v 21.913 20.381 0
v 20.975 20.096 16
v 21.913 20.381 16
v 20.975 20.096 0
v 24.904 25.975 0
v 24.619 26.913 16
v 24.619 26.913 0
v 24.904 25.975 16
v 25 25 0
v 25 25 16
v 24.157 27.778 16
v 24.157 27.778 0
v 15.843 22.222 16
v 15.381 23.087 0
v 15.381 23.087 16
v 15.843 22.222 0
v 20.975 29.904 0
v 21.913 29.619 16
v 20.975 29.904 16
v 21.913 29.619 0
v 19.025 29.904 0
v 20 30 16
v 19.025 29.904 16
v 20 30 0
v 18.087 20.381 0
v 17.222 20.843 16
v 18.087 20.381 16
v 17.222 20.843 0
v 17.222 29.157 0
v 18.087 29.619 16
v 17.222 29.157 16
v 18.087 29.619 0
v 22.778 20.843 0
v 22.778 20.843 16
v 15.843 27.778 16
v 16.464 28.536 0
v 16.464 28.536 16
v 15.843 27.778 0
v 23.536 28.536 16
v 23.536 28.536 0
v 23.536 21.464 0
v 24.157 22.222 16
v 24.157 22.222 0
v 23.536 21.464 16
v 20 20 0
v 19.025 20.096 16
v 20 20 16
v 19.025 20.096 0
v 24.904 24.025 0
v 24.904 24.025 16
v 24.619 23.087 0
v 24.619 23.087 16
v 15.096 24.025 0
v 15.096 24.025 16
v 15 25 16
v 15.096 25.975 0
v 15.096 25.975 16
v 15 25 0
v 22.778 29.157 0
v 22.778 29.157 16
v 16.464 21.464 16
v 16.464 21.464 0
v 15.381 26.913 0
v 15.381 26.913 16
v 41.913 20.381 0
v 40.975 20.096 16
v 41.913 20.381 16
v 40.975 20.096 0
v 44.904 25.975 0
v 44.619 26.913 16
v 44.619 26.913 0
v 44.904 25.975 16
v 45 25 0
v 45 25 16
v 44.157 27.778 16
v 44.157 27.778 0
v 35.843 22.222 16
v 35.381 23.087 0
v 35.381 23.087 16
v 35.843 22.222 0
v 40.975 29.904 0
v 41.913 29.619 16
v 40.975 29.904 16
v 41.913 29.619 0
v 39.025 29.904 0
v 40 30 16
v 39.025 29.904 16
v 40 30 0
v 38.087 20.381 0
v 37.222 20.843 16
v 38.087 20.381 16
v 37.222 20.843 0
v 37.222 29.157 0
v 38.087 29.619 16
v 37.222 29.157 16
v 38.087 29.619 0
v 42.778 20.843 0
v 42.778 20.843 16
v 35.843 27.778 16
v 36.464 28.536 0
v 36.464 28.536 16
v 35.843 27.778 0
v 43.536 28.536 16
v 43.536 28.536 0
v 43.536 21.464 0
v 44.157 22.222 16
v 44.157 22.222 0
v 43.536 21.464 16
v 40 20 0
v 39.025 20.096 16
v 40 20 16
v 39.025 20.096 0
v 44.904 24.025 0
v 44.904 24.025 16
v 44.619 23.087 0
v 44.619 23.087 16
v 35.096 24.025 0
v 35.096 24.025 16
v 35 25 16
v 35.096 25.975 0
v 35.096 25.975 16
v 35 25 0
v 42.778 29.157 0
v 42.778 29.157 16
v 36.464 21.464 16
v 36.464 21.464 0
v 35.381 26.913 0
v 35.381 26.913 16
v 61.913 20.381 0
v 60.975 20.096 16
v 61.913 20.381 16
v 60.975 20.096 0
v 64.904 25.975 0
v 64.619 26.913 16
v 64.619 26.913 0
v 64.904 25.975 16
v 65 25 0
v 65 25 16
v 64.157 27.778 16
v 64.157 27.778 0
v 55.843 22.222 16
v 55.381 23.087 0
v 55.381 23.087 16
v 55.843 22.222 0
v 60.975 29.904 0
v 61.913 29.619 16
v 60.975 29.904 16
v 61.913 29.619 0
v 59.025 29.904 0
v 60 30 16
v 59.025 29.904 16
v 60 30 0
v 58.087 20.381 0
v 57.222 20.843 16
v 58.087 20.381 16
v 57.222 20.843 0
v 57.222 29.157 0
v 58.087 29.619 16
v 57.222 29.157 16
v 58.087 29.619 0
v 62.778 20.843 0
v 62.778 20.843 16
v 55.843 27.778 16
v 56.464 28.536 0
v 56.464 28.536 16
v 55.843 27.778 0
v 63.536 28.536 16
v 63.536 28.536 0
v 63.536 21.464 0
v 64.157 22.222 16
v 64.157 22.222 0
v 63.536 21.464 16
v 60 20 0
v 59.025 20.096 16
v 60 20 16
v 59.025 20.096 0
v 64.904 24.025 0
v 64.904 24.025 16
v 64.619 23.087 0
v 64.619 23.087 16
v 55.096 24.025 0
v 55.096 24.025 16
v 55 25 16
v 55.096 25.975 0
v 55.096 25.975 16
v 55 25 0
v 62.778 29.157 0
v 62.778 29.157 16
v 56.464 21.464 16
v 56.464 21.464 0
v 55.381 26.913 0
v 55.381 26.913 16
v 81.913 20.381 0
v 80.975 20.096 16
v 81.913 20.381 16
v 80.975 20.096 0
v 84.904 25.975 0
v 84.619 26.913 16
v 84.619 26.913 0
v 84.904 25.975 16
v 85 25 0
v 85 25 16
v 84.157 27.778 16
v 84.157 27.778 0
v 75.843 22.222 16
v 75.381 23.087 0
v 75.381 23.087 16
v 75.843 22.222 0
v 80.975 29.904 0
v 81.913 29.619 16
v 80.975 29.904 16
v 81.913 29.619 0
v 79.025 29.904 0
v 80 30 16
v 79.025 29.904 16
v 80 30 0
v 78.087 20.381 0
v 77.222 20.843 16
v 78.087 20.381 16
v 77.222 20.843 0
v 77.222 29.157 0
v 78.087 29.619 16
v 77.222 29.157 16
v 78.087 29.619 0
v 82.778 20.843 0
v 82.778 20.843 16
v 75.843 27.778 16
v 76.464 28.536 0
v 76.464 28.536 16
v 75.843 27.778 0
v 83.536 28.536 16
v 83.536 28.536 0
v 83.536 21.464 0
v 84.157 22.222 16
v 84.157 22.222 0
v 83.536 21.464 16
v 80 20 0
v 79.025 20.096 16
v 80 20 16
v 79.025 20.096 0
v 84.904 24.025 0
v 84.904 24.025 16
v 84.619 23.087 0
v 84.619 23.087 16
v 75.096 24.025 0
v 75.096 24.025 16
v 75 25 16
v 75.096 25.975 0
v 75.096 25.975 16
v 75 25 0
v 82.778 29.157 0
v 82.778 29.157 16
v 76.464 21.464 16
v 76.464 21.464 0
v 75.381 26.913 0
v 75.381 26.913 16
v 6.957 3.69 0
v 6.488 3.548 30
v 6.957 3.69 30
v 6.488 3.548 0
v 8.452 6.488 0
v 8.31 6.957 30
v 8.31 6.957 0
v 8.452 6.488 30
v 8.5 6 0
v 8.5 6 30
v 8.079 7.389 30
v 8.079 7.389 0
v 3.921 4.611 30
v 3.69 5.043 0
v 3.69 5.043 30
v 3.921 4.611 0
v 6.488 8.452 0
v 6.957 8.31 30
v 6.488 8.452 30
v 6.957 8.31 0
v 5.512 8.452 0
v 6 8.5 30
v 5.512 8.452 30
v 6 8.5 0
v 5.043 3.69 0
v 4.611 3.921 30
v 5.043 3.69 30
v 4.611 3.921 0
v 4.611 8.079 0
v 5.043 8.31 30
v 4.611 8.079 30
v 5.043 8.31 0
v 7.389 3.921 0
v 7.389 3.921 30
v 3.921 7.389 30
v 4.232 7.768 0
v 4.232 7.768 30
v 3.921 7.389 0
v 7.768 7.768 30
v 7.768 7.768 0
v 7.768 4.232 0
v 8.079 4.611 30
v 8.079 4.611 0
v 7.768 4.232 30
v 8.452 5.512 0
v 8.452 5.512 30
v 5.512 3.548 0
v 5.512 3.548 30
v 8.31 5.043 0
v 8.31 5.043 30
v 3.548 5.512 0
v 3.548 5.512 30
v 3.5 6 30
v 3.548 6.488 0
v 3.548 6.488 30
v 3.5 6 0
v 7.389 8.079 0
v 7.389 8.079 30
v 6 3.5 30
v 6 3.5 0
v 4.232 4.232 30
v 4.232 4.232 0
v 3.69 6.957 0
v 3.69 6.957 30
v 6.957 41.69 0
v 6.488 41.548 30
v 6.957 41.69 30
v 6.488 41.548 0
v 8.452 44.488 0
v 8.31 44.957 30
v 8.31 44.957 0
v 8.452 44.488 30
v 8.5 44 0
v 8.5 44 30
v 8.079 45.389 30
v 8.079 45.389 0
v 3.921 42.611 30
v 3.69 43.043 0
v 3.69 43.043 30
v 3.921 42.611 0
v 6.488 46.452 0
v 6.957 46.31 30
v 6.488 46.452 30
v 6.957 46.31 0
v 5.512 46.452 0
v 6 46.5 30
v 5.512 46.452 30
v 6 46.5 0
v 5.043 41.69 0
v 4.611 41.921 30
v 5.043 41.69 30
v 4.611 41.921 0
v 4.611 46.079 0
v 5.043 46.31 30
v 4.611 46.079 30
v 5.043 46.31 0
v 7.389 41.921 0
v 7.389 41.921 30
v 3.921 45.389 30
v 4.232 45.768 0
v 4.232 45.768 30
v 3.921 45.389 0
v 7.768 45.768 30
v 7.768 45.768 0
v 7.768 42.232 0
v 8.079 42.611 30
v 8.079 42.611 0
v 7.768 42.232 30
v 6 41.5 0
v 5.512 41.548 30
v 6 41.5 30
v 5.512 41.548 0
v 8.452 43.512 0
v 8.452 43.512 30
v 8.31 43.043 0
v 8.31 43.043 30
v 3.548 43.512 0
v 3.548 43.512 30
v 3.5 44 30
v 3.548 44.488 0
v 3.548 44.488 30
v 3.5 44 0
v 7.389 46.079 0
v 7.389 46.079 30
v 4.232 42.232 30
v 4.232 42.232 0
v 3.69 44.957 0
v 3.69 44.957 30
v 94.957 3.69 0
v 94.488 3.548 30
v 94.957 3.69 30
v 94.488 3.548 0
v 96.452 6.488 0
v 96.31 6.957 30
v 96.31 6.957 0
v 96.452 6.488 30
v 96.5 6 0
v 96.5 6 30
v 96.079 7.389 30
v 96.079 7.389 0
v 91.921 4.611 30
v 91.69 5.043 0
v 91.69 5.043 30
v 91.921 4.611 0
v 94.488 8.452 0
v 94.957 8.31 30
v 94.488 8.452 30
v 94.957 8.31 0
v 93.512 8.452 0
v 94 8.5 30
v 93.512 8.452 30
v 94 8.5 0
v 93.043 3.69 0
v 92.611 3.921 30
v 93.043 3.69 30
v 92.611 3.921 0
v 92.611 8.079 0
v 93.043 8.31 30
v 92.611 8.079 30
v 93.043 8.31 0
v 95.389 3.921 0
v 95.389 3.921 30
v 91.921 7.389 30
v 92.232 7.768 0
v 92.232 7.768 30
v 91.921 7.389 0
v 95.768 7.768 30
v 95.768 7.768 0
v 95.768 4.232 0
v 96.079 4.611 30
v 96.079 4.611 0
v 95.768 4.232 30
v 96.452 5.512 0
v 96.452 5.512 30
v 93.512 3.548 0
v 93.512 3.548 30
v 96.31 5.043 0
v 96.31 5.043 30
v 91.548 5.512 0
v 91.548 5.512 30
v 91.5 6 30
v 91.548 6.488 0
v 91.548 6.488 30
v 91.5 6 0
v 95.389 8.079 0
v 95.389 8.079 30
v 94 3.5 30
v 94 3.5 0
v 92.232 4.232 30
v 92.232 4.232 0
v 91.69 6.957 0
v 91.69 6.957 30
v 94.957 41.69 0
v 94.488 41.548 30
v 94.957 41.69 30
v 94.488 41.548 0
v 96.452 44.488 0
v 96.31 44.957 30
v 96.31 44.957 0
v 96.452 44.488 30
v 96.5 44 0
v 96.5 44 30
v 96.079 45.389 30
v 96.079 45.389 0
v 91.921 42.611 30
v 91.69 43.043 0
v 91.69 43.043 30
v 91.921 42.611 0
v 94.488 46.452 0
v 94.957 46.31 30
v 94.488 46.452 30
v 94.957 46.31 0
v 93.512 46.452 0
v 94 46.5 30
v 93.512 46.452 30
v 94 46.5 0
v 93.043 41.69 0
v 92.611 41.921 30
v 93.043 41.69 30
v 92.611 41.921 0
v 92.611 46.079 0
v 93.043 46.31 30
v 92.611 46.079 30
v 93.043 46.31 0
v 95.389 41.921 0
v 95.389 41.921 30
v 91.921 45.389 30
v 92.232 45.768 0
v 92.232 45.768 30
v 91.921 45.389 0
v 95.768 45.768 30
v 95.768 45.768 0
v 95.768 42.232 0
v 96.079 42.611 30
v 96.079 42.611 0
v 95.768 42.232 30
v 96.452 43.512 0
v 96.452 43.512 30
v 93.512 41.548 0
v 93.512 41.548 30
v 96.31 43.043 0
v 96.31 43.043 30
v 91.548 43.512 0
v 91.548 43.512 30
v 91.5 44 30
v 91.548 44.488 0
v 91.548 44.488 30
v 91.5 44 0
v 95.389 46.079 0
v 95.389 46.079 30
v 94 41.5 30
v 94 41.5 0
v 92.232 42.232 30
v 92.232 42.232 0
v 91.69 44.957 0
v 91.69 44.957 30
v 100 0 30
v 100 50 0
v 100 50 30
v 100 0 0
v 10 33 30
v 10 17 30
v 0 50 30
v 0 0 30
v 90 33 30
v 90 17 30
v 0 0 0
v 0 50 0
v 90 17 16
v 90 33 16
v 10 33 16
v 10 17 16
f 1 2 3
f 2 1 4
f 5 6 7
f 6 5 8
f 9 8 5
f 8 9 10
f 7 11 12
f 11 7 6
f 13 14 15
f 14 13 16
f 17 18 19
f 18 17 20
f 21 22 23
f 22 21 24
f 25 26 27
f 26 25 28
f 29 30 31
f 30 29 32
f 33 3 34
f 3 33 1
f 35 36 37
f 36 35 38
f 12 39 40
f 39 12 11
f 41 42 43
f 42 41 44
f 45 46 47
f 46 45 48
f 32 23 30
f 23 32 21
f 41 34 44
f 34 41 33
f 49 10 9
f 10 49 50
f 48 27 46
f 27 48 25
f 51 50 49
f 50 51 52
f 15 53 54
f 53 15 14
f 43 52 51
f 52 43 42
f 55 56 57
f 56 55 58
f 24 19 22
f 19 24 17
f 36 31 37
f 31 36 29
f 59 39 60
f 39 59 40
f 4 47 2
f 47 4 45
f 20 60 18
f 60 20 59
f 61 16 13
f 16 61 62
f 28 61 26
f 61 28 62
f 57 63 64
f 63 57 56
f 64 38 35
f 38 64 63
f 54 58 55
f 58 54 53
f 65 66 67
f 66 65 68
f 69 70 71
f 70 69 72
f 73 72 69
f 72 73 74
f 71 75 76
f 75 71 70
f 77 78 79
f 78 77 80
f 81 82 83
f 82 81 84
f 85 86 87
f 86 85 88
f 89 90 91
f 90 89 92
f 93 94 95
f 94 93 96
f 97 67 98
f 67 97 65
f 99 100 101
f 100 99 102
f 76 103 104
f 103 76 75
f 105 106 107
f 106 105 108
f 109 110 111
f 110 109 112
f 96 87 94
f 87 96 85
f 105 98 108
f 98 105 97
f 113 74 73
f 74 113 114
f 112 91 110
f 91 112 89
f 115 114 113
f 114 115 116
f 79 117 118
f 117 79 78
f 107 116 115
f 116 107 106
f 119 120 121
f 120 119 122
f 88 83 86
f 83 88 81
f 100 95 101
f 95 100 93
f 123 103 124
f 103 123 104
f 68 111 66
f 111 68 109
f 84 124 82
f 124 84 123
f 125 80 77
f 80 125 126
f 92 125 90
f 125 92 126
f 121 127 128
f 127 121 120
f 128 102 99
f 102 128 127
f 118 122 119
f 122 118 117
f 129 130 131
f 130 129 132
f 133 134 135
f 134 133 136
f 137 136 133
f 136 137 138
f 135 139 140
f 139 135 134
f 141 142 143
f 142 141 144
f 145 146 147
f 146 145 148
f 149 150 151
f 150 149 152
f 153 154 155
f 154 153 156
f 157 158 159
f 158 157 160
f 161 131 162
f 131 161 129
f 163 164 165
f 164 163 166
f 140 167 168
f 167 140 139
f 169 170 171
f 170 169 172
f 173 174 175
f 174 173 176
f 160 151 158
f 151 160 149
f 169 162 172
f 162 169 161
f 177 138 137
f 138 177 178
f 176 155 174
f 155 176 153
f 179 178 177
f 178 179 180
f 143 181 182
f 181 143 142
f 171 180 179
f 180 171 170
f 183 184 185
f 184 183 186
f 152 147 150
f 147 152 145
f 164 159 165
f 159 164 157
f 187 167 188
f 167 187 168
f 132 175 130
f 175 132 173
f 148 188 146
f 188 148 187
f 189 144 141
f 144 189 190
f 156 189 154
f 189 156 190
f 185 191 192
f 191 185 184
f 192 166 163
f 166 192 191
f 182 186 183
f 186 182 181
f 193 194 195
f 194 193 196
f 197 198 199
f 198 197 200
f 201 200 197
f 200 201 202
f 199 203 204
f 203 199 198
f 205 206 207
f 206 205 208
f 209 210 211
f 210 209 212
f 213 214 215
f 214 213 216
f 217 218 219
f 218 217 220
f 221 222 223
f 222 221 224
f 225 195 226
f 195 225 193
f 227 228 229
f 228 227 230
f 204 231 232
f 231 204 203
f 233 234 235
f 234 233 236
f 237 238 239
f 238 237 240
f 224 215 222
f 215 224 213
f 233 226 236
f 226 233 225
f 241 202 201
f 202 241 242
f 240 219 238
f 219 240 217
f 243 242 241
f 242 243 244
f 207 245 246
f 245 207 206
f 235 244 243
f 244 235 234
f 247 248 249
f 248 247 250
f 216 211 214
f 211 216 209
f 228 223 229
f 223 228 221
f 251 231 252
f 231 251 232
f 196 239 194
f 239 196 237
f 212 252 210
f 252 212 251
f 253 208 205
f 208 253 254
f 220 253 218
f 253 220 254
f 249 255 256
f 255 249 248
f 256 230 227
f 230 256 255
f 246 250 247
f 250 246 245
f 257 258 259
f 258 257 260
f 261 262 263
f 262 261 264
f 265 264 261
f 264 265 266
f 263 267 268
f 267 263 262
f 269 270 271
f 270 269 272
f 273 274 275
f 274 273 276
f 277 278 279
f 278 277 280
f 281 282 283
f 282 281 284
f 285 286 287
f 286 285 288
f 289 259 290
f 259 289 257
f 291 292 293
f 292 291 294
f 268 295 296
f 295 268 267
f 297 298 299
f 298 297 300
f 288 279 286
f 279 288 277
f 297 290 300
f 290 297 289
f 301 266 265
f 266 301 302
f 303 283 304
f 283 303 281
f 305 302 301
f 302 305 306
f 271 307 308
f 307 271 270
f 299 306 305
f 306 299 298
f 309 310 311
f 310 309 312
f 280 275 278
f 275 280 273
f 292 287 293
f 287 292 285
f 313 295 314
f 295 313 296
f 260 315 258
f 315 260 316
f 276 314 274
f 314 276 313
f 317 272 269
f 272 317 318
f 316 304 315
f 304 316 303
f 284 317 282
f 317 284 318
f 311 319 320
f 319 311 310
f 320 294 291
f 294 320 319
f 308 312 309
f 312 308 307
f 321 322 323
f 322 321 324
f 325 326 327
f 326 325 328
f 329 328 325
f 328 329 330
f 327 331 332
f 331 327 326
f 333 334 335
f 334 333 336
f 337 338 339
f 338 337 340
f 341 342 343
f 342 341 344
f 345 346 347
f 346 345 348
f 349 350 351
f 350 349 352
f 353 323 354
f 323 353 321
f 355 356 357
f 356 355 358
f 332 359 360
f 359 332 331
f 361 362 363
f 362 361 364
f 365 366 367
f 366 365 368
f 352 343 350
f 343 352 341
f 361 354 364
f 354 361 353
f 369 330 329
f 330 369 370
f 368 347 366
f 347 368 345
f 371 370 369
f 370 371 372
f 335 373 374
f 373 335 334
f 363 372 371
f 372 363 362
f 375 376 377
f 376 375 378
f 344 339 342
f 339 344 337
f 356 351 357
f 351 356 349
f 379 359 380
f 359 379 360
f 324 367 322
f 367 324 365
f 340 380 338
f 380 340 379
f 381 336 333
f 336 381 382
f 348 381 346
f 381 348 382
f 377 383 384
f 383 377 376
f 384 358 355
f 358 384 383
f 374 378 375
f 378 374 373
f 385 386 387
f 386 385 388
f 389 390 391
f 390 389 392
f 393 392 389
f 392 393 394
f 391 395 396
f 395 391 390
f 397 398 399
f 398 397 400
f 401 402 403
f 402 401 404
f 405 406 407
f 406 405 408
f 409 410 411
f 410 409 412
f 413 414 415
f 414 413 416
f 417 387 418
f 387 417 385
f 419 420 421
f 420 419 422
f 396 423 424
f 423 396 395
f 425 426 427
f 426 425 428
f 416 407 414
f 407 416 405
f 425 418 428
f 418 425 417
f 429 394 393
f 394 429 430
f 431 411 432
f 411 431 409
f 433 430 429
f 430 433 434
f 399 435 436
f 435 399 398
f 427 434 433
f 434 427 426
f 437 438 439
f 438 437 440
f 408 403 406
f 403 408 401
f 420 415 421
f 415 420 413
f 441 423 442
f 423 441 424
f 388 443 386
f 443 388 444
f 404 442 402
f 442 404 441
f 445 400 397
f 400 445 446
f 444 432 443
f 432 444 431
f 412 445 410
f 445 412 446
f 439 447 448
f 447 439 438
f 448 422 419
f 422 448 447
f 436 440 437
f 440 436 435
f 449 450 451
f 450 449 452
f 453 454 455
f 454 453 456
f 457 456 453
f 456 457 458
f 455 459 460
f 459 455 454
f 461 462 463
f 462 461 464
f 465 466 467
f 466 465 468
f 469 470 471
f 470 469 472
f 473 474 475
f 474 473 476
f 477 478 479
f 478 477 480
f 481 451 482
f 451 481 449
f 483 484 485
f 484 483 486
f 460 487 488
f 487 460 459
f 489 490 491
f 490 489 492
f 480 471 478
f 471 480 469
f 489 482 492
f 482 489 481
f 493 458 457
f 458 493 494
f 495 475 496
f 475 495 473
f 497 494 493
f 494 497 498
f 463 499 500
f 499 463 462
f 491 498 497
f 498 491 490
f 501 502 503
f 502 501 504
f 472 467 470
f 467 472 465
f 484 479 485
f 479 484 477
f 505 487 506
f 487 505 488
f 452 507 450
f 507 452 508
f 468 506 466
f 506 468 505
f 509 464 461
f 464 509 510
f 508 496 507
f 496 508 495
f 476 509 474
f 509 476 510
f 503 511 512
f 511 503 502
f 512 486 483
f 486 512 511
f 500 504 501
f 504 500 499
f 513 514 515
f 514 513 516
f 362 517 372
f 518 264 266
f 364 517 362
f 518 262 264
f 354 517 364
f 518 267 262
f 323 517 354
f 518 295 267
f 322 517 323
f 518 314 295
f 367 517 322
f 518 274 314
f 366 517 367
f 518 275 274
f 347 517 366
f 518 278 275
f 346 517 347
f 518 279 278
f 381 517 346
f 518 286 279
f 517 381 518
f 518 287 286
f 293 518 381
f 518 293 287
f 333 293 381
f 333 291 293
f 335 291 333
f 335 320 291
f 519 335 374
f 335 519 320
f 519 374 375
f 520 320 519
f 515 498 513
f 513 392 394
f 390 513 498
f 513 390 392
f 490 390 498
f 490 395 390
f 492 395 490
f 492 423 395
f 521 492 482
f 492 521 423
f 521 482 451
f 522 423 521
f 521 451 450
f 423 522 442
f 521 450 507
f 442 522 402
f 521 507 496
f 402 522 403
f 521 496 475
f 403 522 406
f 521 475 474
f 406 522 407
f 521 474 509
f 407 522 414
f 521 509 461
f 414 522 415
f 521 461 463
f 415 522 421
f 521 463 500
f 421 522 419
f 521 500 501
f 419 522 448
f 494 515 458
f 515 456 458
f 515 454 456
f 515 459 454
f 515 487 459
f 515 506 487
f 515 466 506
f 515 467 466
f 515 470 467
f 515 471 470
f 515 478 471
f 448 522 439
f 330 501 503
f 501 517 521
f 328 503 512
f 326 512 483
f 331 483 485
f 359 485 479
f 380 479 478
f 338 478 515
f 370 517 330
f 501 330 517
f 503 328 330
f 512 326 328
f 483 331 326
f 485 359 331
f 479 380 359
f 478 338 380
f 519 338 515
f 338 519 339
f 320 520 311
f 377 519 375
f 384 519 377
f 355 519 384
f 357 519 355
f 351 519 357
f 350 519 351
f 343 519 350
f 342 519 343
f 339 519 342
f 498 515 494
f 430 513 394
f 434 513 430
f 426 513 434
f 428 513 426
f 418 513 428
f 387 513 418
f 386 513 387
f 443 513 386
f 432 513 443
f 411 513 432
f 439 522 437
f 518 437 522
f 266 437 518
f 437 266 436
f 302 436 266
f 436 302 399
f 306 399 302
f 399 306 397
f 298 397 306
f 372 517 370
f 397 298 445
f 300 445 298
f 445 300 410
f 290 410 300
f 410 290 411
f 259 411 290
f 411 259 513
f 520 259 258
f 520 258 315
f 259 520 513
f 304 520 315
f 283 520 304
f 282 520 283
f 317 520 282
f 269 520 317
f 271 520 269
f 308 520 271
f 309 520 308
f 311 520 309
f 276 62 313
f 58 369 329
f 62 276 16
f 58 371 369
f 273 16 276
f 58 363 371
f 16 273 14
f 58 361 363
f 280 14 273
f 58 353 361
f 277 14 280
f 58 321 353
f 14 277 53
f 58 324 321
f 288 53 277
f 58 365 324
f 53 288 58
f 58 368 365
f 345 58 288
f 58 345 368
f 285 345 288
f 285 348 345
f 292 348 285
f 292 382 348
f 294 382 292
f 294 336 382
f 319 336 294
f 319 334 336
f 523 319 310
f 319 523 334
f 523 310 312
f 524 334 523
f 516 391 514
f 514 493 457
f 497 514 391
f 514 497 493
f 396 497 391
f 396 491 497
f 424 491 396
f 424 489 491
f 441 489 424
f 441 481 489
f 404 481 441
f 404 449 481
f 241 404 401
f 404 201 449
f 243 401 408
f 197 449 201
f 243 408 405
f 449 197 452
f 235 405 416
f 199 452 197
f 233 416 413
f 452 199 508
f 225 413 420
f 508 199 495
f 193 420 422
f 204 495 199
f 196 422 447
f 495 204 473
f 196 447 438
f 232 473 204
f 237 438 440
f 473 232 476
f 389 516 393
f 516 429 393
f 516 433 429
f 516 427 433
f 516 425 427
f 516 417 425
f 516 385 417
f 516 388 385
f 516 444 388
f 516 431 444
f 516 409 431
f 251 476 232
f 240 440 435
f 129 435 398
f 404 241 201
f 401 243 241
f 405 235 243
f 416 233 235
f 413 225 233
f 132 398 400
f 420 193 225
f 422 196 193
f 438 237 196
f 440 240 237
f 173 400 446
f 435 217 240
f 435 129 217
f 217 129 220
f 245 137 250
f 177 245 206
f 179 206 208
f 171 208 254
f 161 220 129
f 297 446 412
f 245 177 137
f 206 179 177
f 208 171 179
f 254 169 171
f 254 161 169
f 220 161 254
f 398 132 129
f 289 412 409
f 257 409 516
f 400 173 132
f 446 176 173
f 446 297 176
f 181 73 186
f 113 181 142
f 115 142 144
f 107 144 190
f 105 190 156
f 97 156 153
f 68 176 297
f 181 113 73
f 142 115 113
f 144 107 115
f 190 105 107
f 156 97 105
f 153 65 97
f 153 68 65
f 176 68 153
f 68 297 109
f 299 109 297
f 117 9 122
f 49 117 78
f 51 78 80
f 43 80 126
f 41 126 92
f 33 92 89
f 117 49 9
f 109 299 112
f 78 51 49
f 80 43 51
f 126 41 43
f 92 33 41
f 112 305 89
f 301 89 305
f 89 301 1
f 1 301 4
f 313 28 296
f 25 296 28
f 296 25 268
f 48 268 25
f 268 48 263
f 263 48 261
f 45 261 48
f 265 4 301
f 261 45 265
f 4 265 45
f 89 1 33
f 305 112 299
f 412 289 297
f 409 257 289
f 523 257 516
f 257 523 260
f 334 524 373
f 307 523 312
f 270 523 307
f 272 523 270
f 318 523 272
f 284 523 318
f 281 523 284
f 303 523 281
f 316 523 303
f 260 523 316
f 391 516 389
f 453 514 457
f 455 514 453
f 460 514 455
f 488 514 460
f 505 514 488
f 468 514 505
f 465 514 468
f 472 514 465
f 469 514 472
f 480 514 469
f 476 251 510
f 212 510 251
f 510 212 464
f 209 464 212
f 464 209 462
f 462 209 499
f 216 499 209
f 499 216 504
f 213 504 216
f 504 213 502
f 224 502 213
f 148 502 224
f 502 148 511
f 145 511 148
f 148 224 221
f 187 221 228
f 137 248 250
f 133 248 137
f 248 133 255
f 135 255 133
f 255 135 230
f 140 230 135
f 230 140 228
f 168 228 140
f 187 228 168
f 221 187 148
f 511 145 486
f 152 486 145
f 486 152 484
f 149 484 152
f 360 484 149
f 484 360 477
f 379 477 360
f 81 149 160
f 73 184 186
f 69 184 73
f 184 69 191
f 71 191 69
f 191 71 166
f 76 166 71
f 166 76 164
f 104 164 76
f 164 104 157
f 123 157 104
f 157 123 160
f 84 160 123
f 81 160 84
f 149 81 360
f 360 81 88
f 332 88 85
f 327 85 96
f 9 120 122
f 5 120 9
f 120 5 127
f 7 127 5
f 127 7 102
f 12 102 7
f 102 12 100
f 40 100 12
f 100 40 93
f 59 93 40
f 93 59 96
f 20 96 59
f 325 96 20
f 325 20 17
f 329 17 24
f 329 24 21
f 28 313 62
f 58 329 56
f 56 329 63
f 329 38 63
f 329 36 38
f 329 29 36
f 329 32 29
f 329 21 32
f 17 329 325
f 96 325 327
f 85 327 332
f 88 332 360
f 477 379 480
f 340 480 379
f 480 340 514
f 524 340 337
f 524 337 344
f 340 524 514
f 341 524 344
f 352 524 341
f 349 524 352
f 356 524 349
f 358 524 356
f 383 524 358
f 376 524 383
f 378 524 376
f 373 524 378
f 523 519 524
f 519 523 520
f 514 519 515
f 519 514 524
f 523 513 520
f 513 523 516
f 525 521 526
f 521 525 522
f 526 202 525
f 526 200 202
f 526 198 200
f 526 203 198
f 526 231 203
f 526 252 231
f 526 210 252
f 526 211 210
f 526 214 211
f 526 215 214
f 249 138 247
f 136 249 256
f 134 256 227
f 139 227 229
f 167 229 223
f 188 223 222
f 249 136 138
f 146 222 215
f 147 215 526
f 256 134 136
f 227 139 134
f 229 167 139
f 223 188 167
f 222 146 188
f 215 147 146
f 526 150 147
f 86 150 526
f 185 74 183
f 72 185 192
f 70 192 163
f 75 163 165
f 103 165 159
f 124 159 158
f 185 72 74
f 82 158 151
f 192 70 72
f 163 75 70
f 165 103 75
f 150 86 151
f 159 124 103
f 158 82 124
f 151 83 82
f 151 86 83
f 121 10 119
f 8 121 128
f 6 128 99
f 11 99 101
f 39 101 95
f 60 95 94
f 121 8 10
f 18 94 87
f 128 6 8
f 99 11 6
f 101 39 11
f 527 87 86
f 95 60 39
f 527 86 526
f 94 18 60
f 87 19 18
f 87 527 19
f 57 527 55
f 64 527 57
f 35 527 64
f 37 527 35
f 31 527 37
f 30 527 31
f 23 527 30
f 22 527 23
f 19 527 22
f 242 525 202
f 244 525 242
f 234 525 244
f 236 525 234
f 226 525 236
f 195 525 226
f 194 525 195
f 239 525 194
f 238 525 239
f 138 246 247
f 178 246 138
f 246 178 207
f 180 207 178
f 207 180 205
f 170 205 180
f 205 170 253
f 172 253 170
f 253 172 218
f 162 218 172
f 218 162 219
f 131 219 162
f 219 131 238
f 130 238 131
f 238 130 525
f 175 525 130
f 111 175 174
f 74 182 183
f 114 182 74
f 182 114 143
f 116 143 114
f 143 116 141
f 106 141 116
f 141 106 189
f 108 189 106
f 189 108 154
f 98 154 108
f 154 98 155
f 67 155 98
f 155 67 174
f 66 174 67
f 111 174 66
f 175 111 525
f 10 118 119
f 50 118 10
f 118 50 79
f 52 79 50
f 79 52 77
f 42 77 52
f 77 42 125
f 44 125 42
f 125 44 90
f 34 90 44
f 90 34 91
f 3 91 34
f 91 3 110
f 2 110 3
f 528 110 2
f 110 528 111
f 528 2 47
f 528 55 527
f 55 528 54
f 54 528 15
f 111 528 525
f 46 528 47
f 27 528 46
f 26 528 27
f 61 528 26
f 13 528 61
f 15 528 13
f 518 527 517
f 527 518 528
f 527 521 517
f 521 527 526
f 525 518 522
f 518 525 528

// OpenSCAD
$fn = 32;

// ----------------------------------------------------------------------
// Manifold block: gallery_top manifold
// ----------------------------------------------------------------------

// --- parameters (mm) ---
block_l = 100;            // block length, X
block_w = 50;             // block width, Y
block_h = 30;             // block height, Z
port_d = 10;              // port bore diameter
port_pitch = 20;          // port pitch along X
gallery_d = 16;           // top gallery width, Y
gallery_depth = 14;       // gallery pocket depth
wall_p = 10;              // gallery end wall thickness, X
mnt_d = 5;                // mounting hole diameter
mnt_in = 6;               // mounting hole inset from the edges

n_ports = 4;  // ports in the row
port_x0 = (block_l - (n_ports - 1) * port_pitch) / 2;  // first port X

difference() {
  cube([block_l, block_w, block_h]);
  for (i = [0 : n_ports - 1])
    translate([port_x0 + i * port_pitch, block_w / 2, -1])
      cylinder(h = block_h + 2, d = port_d);
  translate([wall_p, block_w / 2 - gallery_d / 2, block_h - gallery_depth])
    cube([block_l - 2 * wall_p, gallery_d, gallery_depth + 1]);
  for (cx = [mnt_in, block_l - mnt_in])
    for (cy = [mnt_in, block_w - mnt_in])
      translate([cx, cy, -1]) cylinder(h = block_h + 2, d = mnt_d);
}
